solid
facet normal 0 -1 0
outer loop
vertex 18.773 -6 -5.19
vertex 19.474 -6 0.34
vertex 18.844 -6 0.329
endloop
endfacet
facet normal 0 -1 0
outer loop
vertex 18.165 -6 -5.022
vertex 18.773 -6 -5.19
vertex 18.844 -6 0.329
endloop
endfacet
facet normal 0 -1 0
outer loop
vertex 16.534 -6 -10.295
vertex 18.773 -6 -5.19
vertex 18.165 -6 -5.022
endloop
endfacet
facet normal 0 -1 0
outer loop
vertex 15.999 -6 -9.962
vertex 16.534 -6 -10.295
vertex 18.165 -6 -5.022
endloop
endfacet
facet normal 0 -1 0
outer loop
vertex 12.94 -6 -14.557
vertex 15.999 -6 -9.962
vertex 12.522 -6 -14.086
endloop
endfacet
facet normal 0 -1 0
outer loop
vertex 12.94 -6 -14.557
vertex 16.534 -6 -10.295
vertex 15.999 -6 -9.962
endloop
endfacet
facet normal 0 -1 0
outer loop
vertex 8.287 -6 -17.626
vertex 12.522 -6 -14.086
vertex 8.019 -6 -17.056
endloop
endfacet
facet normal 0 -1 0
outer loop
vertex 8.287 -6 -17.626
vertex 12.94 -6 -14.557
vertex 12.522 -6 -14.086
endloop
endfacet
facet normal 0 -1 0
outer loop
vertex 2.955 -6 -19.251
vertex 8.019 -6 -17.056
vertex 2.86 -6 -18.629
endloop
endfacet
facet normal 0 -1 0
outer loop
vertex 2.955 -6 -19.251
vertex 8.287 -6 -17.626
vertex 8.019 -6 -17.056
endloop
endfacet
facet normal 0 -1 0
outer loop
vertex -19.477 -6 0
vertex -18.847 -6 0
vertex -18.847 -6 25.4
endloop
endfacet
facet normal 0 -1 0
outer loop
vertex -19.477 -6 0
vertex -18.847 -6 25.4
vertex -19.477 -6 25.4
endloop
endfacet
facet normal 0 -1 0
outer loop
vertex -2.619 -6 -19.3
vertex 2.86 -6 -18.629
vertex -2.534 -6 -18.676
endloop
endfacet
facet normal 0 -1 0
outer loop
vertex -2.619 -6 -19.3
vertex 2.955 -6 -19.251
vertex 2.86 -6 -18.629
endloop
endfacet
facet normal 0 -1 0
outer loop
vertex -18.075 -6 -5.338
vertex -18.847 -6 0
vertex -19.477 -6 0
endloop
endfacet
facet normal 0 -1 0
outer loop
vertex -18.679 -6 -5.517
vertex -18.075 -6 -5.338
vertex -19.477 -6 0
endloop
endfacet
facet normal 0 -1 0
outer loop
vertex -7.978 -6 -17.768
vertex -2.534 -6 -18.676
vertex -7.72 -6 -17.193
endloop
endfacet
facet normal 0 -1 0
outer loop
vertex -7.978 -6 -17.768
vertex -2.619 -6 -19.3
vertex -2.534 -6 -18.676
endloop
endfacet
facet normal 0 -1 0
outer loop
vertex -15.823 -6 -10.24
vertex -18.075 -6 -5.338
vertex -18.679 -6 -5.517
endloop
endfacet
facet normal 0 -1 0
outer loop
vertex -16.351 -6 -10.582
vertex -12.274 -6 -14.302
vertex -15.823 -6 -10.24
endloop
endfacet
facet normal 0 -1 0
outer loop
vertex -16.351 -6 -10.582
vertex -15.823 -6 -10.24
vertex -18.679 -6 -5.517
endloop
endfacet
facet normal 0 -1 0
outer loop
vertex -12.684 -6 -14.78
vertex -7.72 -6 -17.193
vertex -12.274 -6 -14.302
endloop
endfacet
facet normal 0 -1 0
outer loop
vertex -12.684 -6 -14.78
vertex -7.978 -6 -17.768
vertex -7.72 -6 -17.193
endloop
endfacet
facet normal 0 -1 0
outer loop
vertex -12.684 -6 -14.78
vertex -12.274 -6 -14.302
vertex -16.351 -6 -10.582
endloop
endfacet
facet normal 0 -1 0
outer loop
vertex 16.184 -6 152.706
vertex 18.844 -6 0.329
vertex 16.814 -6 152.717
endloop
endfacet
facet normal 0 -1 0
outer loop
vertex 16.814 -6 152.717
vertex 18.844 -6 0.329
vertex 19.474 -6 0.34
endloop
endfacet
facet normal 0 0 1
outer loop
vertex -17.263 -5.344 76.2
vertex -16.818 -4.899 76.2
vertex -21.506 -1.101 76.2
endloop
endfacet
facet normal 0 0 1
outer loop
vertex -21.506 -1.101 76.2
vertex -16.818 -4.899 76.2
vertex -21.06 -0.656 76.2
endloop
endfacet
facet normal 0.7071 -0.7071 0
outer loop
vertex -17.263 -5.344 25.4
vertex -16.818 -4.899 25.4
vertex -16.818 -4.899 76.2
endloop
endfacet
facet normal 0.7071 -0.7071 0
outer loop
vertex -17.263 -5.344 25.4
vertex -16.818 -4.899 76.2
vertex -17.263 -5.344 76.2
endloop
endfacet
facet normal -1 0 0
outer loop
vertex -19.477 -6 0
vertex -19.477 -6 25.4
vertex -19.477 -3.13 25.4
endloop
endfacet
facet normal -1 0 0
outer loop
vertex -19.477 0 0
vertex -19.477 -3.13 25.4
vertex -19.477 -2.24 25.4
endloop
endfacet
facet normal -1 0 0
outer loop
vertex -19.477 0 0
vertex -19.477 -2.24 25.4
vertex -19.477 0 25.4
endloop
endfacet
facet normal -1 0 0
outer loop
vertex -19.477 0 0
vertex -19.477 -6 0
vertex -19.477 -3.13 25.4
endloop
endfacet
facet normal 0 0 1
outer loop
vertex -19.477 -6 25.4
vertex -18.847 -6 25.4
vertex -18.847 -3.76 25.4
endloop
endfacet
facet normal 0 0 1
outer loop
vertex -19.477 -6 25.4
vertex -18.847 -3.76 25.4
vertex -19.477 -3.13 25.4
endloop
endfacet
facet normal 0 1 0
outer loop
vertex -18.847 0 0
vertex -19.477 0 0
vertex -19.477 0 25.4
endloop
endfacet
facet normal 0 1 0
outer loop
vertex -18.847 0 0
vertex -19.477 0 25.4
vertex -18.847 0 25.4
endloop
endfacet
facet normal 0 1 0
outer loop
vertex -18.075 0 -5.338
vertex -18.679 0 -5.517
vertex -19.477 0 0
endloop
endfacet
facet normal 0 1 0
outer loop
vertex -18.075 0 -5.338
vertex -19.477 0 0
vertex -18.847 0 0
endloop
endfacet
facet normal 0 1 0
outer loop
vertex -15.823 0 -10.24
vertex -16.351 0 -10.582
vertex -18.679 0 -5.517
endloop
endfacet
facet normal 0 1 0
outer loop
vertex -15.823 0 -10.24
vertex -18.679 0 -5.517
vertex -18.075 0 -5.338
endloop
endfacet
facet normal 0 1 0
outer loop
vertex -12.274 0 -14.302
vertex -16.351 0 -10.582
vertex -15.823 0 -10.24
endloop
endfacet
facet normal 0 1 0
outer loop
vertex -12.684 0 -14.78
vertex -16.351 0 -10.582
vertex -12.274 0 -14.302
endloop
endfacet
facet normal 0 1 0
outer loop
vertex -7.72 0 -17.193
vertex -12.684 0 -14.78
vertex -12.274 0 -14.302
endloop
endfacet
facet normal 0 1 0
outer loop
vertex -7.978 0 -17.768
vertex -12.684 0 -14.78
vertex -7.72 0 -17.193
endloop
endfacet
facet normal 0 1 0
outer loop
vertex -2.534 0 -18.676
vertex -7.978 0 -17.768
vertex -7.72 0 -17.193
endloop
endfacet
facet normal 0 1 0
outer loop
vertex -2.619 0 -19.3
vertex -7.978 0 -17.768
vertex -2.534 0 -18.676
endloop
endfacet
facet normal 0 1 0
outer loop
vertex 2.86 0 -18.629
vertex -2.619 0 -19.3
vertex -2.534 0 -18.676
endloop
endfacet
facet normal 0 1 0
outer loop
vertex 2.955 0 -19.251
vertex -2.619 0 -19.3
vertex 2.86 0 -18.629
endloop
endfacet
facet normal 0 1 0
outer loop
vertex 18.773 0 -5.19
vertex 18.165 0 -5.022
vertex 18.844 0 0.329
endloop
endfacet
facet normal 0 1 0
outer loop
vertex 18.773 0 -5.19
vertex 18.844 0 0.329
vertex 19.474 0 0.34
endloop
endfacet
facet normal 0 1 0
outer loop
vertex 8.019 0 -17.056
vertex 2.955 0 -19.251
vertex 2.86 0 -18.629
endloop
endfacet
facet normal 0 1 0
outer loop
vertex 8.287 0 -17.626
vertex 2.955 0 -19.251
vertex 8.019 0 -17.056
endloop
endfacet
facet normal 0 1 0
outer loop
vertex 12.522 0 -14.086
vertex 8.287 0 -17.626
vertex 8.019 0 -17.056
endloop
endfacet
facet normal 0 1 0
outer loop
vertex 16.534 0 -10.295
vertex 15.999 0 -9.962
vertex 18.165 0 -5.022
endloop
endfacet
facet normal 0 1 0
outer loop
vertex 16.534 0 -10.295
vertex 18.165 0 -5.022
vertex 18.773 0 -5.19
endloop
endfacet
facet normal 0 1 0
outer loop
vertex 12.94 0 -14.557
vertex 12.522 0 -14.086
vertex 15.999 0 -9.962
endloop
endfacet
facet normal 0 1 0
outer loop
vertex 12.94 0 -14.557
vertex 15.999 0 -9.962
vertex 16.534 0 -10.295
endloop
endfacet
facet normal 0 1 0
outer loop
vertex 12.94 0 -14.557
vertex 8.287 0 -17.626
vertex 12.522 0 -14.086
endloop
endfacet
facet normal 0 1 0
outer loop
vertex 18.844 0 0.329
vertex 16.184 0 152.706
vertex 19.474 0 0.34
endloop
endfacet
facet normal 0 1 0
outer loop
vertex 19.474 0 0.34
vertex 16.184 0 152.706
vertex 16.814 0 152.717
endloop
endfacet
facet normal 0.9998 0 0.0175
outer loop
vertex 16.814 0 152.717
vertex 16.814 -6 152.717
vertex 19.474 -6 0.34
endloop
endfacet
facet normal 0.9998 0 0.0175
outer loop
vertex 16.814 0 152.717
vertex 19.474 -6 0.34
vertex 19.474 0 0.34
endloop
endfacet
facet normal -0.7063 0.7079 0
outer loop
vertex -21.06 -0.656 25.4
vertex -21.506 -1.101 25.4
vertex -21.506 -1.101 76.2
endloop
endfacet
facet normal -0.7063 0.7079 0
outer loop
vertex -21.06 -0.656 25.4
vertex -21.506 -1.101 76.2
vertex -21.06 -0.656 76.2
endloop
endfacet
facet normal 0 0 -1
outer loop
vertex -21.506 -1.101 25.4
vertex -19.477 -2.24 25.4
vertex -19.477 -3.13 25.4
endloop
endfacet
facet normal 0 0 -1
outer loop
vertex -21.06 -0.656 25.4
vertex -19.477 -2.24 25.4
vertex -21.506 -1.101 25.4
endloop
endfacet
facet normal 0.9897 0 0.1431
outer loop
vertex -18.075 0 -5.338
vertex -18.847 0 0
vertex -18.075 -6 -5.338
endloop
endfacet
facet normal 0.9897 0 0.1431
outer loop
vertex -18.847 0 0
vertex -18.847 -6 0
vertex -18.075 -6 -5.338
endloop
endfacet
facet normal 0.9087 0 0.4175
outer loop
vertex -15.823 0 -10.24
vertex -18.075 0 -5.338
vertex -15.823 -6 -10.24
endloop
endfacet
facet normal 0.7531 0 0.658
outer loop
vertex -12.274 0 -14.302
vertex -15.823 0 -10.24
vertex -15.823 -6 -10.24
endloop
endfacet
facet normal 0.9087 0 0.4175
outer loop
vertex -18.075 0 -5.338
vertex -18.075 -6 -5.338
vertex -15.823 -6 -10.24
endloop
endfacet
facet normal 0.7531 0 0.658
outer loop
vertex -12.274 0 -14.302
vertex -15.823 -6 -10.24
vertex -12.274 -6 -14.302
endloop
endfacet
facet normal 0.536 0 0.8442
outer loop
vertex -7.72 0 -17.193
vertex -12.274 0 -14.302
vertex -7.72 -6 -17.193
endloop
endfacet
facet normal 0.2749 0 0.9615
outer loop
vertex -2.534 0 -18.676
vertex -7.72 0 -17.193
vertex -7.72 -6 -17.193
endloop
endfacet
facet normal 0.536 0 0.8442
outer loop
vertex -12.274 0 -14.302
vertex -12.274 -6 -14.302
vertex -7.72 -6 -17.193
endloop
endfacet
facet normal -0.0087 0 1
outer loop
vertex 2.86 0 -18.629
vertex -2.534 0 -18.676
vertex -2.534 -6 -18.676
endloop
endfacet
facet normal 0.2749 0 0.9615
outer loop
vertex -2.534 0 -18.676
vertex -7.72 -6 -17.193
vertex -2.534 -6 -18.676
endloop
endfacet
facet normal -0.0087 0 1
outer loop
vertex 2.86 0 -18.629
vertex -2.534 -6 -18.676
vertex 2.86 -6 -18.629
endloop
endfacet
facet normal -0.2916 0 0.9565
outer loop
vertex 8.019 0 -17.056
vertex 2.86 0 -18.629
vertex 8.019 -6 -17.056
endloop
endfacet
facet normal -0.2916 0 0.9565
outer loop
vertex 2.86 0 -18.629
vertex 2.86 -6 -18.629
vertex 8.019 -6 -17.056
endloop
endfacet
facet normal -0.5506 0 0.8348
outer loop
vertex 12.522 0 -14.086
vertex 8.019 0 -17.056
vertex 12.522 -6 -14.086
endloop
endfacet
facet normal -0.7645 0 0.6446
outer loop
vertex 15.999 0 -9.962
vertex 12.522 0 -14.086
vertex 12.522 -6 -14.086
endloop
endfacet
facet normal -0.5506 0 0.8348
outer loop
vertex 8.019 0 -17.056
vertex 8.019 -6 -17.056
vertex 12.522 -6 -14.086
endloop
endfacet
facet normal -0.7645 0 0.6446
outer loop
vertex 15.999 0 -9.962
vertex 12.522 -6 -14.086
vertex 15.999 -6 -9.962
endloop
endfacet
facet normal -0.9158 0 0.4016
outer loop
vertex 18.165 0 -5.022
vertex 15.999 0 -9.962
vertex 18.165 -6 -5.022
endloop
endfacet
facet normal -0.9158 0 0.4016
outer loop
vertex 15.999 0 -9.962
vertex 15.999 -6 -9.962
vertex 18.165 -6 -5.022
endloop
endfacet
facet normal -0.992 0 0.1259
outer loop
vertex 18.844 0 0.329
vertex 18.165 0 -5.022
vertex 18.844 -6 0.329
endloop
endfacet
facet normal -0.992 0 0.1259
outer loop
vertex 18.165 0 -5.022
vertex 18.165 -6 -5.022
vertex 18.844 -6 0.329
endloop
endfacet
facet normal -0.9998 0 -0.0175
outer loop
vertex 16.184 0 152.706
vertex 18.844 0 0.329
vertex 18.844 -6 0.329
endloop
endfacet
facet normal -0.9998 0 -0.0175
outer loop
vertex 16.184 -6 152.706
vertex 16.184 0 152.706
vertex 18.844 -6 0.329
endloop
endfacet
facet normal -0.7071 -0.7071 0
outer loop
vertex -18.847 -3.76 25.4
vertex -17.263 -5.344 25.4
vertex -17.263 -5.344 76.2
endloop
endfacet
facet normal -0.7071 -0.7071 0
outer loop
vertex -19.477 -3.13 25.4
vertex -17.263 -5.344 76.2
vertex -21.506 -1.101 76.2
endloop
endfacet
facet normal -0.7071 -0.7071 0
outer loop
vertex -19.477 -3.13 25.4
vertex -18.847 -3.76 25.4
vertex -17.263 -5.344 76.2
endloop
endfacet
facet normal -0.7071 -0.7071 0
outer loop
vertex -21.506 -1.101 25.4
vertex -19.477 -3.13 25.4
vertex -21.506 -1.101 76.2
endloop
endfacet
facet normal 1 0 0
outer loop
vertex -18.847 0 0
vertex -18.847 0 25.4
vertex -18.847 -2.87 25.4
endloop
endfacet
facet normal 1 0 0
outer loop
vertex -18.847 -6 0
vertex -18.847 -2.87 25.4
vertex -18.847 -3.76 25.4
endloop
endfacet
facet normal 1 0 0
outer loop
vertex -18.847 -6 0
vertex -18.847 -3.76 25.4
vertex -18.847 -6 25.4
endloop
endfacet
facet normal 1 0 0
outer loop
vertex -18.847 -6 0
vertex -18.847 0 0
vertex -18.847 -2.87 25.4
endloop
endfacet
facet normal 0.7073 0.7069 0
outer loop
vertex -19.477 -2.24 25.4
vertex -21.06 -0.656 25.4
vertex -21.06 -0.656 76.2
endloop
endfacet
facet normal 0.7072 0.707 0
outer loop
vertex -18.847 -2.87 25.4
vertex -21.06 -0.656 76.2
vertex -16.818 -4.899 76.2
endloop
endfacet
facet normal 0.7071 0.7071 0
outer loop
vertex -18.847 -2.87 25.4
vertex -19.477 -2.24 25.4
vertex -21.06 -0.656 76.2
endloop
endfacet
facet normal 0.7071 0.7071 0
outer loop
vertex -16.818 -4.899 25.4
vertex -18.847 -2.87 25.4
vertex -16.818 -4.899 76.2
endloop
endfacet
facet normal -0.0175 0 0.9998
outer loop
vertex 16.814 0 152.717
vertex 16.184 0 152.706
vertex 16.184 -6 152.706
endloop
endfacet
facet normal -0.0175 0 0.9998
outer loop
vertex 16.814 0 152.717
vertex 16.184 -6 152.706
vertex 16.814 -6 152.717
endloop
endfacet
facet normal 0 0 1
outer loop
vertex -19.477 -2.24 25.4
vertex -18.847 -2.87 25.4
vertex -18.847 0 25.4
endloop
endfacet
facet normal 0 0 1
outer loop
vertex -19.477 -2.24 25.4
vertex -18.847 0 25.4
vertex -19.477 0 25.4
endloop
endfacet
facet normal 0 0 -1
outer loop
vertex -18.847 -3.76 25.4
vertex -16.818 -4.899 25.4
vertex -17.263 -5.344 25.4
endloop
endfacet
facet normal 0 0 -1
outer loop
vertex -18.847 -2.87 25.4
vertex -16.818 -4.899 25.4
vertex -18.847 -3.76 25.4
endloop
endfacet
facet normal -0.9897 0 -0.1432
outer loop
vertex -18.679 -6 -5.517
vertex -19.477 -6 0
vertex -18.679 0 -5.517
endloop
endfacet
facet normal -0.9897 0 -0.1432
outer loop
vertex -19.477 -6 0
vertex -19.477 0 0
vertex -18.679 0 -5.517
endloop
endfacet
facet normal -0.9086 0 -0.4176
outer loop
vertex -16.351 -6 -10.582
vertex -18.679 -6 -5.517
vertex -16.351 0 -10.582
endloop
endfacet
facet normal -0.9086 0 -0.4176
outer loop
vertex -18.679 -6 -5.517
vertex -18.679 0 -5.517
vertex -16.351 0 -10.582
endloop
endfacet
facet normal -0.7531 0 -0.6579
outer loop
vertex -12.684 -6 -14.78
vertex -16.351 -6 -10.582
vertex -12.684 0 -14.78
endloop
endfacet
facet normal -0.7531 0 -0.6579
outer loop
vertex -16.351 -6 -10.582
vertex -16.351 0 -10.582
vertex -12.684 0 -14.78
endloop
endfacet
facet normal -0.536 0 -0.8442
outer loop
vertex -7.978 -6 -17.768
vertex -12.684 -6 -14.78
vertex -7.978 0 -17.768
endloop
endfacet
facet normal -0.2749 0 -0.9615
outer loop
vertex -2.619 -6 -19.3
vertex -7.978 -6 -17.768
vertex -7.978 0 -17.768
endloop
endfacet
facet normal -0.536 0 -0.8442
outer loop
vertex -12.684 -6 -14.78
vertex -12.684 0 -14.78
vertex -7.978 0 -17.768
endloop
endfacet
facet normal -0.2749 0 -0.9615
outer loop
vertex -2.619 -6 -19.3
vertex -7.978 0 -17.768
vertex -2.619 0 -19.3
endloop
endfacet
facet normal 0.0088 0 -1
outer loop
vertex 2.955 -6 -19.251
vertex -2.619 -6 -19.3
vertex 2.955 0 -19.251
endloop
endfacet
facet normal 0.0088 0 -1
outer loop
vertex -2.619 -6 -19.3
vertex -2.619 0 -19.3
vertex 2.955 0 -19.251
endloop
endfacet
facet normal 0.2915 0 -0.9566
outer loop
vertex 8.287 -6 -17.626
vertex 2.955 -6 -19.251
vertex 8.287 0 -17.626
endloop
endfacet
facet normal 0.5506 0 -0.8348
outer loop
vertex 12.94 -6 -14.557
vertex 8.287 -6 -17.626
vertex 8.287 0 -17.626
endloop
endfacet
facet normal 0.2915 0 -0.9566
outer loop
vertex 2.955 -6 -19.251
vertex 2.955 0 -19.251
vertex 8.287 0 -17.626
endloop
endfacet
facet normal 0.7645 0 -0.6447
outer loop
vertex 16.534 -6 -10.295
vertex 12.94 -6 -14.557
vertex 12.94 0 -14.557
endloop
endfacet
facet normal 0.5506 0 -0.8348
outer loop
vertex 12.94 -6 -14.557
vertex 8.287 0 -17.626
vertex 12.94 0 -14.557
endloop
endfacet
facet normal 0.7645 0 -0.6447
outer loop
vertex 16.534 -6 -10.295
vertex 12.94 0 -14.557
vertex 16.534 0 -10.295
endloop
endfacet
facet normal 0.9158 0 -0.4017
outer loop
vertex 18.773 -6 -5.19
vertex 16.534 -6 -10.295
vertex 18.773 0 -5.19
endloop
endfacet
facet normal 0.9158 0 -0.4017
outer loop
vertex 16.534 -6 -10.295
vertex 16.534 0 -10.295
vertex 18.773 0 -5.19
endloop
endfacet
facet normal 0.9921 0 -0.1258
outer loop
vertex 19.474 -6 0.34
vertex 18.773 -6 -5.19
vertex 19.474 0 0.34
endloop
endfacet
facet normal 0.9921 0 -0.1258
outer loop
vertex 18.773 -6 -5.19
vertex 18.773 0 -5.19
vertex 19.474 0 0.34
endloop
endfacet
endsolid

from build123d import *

# Parameters (mm, degrees)
SKETCH2_W           = 0.63000001
SKETCH2_H           = 6
BOSS_EXTRUDE1_DEPTH = 50.8


with BuildPart() as part:
    # Sweep1: sweep along a path in Sketch1
    with BuildLine(Plane(origin=(0, 0, 0), x_dir=(1, 0, 0), z_dir=(0, 1, 0))) as sweep1_path:
        Line((-18.8468, -25.4), (-18.8468, 0))
        ThreePointArc((-18.8468, 0), (0.164467269, 18.846082372), (18.843929541, -0.328922014))
        Line((18.843929541, -0.328922014), (16.1841828, -152.705710755))
    # Sketch2 → Sweep1 (sweep)
    with BuildSketch(Plane(origin=(-18.8468, 0, 25.4), x_dir=(-1, 0, 0), z_dir=(0, 0, -1))):
        with Locations((0.315000005, -3)):
            Rectangle(SKETCH2_W, SKETCH2_H)
    sweep(path=sweep1_path.line)

    # Sketch3 → Boss-Extrude1 (add)
    with BuildSketch(Plane.XY.offset(25.4)):
        Polygon((-21.060381709, -0.655941017), (-16.817741022, -4.898581704), (-17.263218301, -5.344058983), (-21.505858988, -1.101418296), align=None)
    extrude(amount=BOSS_EXTRUDE1_DEPTH)


solid = part.part
